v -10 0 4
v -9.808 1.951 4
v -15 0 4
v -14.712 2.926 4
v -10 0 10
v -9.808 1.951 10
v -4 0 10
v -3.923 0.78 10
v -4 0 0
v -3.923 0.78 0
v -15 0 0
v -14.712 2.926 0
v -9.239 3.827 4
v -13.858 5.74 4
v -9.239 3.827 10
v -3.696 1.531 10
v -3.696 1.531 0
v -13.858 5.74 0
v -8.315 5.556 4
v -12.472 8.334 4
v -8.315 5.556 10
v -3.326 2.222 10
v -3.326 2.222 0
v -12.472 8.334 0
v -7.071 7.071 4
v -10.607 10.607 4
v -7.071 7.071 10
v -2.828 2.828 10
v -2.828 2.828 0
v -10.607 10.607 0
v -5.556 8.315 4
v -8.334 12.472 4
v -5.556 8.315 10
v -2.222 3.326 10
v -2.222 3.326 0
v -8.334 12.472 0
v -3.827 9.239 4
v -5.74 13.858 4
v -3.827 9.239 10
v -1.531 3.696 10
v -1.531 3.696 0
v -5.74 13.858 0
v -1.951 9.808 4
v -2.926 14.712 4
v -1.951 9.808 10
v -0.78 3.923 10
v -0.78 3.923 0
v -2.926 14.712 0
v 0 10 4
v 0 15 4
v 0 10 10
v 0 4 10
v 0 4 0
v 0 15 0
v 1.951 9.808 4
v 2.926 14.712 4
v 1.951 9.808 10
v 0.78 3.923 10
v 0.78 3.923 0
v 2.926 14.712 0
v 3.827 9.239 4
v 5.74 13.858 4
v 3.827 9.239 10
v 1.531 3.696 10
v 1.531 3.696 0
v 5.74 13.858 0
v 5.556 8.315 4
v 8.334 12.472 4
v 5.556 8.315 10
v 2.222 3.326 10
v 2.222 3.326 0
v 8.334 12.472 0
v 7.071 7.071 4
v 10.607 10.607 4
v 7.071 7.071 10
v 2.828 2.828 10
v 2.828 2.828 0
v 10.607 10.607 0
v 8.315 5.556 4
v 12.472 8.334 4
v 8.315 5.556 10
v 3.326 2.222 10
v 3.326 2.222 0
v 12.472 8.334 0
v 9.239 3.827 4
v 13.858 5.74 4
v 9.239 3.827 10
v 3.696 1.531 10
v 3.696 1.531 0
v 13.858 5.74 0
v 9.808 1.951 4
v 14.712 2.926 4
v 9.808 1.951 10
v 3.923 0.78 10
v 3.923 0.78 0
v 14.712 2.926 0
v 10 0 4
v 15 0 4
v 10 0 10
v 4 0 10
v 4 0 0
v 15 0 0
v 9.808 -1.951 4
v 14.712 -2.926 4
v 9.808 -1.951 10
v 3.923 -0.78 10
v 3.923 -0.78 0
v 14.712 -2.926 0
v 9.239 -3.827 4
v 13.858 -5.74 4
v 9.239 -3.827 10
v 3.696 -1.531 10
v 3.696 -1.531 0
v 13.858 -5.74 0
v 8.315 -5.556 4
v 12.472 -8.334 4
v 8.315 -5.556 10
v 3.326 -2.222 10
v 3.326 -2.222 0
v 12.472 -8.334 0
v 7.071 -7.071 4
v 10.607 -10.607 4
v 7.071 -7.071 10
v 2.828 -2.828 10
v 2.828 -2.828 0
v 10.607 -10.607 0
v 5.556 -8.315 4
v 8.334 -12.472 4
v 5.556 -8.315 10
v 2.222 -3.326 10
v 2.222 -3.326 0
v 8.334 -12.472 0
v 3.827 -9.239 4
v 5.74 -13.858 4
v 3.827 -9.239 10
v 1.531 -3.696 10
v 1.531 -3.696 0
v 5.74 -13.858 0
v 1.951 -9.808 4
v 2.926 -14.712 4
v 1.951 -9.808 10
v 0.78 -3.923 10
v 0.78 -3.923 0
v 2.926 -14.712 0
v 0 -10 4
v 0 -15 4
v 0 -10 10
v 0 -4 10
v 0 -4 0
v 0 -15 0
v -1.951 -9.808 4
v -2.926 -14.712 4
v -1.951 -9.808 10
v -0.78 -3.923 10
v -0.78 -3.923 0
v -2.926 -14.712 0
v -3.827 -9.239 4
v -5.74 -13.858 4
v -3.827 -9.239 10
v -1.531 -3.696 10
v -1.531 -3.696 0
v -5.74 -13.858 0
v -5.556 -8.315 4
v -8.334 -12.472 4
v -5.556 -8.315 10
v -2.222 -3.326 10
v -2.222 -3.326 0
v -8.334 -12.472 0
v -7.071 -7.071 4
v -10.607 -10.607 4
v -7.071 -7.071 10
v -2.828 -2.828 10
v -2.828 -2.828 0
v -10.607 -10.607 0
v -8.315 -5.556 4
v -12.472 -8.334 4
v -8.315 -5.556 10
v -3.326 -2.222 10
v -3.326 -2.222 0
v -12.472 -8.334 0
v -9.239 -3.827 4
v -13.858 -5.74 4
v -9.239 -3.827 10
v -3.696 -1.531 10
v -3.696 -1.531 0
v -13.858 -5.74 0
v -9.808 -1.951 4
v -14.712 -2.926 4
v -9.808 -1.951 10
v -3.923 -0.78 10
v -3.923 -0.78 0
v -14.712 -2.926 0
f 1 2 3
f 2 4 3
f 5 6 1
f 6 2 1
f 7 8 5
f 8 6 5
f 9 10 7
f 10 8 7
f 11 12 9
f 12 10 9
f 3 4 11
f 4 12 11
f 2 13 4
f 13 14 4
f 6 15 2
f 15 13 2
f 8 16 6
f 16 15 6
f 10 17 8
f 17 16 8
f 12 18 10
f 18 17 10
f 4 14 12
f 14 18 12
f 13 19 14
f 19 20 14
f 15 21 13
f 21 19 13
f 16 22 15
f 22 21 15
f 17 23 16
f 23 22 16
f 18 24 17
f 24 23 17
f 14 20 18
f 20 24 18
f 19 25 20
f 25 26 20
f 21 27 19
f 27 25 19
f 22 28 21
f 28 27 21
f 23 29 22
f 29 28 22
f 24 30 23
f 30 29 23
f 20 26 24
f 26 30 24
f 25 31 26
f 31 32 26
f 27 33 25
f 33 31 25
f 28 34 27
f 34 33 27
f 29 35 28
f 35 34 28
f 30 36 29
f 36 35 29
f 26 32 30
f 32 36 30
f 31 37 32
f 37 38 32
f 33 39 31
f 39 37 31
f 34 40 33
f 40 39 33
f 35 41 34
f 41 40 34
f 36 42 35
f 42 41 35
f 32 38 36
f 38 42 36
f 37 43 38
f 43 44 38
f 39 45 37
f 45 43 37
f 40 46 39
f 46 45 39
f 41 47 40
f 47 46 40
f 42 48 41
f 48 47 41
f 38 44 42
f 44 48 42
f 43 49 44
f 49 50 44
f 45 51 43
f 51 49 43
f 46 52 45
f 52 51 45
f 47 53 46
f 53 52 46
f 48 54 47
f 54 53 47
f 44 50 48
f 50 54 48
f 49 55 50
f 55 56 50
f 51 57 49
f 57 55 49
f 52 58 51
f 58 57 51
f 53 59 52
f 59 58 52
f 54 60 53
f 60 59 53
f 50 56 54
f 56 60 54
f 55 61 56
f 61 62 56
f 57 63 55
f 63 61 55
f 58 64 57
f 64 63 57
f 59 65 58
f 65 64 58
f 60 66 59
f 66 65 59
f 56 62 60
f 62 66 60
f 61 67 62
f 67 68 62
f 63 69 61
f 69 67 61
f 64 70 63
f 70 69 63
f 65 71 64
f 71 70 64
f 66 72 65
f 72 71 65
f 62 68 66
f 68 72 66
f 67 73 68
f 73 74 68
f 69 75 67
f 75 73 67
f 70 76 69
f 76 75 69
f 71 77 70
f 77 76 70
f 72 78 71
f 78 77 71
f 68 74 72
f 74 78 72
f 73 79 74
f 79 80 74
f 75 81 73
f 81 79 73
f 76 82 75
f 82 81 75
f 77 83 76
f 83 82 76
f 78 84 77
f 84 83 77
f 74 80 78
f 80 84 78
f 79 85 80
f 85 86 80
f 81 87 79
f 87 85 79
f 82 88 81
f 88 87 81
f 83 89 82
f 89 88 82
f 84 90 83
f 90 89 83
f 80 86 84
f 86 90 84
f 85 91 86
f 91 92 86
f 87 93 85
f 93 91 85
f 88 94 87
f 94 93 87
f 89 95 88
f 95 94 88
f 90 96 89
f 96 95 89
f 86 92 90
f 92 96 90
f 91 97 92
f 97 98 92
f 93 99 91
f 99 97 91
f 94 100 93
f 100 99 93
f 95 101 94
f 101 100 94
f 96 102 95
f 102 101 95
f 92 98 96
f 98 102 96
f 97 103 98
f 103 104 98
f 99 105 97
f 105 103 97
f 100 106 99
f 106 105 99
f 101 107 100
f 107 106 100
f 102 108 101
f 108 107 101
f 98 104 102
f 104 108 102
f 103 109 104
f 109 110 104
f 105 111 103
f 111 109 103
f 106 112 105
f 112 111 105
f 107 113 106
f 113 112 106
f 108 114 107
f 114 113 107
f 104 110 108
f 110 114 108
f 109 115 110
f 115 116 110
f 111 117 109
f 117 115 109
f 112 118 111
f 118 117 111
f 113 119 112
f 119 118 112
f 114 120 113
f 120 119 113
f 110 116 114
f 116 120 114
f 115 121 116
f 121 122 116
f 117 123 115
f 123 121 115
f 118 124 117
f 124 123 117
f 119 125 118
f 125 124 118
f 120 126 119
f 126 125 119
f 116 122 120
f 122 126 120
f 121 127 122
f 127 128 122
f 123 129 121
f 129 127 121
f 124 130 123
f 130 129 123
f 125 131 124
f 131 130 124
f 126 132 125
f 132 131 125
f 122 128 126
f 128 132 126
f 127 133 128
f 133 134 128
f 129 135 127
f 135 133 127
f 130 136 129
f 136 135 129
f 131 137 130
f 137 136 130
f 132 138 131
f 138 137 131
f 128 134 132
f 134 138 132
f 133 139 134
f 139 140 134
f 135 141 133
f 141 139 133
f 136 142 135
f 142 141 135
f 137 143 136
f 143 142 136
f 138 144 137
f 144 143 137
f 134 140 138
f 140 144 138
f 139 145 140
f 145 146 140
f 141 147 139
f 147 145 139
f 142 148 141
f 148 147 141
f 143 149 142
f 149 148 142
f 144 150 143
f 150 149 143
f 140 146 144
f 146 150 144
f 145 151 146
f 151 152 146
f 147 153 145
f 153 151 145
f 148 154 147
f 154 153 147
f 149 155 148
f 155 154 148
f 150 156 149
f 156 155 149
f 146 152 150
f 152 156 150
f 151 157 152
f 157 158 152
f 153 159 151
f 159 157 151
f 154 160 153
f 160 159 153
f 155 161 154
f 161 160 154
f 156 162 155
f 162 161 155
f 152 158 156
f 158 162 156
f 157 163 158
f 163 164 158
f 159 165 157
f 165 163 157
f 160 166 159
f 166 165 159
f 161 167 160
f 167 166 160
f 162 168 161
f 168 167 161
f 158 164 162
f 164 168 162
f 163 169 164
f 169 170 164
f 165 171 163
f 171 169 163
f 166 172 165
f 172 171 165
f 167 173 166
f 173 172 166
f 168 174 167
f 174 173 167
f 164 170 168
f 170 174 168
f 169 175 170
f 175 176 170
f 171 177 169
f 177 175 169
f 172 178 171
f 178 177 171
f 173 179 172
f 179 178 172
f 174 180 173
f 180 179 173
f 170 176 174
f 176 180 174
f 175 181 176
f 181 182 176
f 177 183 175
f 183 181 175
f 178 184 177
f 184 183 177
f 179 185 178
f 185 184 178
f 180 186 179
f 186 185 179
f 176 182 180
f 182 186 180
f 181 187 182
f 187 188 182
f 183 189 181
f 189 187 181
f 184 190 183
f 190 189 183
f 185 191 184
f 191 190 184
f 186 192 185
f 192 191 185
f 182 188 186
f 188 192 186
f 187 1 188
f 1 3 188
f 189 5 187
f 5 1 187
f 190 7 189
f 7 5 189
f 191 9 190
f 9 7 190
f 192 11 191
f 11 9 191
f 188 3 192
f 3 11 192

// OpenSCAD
$fn = 32;

// ----------------------------------------------------------------------
// Arc stop: collar, 10 mm thick
// ----------------------------------------------------------------------

// --- parameters (mm) ---
revolve_angle = 360;      // full turn around the Z axis
profile_points = 6;       // points of the closed outline

profile = [[4, 0], [15, 0], [15, 4], [10, 4], [10, 10], [4, 10]];  // single closed polygon, 6 points, counter clockwise

// --- the one profile operation ---
rotate_extrude(angle = revolve_angle) polygon(points = profile);
